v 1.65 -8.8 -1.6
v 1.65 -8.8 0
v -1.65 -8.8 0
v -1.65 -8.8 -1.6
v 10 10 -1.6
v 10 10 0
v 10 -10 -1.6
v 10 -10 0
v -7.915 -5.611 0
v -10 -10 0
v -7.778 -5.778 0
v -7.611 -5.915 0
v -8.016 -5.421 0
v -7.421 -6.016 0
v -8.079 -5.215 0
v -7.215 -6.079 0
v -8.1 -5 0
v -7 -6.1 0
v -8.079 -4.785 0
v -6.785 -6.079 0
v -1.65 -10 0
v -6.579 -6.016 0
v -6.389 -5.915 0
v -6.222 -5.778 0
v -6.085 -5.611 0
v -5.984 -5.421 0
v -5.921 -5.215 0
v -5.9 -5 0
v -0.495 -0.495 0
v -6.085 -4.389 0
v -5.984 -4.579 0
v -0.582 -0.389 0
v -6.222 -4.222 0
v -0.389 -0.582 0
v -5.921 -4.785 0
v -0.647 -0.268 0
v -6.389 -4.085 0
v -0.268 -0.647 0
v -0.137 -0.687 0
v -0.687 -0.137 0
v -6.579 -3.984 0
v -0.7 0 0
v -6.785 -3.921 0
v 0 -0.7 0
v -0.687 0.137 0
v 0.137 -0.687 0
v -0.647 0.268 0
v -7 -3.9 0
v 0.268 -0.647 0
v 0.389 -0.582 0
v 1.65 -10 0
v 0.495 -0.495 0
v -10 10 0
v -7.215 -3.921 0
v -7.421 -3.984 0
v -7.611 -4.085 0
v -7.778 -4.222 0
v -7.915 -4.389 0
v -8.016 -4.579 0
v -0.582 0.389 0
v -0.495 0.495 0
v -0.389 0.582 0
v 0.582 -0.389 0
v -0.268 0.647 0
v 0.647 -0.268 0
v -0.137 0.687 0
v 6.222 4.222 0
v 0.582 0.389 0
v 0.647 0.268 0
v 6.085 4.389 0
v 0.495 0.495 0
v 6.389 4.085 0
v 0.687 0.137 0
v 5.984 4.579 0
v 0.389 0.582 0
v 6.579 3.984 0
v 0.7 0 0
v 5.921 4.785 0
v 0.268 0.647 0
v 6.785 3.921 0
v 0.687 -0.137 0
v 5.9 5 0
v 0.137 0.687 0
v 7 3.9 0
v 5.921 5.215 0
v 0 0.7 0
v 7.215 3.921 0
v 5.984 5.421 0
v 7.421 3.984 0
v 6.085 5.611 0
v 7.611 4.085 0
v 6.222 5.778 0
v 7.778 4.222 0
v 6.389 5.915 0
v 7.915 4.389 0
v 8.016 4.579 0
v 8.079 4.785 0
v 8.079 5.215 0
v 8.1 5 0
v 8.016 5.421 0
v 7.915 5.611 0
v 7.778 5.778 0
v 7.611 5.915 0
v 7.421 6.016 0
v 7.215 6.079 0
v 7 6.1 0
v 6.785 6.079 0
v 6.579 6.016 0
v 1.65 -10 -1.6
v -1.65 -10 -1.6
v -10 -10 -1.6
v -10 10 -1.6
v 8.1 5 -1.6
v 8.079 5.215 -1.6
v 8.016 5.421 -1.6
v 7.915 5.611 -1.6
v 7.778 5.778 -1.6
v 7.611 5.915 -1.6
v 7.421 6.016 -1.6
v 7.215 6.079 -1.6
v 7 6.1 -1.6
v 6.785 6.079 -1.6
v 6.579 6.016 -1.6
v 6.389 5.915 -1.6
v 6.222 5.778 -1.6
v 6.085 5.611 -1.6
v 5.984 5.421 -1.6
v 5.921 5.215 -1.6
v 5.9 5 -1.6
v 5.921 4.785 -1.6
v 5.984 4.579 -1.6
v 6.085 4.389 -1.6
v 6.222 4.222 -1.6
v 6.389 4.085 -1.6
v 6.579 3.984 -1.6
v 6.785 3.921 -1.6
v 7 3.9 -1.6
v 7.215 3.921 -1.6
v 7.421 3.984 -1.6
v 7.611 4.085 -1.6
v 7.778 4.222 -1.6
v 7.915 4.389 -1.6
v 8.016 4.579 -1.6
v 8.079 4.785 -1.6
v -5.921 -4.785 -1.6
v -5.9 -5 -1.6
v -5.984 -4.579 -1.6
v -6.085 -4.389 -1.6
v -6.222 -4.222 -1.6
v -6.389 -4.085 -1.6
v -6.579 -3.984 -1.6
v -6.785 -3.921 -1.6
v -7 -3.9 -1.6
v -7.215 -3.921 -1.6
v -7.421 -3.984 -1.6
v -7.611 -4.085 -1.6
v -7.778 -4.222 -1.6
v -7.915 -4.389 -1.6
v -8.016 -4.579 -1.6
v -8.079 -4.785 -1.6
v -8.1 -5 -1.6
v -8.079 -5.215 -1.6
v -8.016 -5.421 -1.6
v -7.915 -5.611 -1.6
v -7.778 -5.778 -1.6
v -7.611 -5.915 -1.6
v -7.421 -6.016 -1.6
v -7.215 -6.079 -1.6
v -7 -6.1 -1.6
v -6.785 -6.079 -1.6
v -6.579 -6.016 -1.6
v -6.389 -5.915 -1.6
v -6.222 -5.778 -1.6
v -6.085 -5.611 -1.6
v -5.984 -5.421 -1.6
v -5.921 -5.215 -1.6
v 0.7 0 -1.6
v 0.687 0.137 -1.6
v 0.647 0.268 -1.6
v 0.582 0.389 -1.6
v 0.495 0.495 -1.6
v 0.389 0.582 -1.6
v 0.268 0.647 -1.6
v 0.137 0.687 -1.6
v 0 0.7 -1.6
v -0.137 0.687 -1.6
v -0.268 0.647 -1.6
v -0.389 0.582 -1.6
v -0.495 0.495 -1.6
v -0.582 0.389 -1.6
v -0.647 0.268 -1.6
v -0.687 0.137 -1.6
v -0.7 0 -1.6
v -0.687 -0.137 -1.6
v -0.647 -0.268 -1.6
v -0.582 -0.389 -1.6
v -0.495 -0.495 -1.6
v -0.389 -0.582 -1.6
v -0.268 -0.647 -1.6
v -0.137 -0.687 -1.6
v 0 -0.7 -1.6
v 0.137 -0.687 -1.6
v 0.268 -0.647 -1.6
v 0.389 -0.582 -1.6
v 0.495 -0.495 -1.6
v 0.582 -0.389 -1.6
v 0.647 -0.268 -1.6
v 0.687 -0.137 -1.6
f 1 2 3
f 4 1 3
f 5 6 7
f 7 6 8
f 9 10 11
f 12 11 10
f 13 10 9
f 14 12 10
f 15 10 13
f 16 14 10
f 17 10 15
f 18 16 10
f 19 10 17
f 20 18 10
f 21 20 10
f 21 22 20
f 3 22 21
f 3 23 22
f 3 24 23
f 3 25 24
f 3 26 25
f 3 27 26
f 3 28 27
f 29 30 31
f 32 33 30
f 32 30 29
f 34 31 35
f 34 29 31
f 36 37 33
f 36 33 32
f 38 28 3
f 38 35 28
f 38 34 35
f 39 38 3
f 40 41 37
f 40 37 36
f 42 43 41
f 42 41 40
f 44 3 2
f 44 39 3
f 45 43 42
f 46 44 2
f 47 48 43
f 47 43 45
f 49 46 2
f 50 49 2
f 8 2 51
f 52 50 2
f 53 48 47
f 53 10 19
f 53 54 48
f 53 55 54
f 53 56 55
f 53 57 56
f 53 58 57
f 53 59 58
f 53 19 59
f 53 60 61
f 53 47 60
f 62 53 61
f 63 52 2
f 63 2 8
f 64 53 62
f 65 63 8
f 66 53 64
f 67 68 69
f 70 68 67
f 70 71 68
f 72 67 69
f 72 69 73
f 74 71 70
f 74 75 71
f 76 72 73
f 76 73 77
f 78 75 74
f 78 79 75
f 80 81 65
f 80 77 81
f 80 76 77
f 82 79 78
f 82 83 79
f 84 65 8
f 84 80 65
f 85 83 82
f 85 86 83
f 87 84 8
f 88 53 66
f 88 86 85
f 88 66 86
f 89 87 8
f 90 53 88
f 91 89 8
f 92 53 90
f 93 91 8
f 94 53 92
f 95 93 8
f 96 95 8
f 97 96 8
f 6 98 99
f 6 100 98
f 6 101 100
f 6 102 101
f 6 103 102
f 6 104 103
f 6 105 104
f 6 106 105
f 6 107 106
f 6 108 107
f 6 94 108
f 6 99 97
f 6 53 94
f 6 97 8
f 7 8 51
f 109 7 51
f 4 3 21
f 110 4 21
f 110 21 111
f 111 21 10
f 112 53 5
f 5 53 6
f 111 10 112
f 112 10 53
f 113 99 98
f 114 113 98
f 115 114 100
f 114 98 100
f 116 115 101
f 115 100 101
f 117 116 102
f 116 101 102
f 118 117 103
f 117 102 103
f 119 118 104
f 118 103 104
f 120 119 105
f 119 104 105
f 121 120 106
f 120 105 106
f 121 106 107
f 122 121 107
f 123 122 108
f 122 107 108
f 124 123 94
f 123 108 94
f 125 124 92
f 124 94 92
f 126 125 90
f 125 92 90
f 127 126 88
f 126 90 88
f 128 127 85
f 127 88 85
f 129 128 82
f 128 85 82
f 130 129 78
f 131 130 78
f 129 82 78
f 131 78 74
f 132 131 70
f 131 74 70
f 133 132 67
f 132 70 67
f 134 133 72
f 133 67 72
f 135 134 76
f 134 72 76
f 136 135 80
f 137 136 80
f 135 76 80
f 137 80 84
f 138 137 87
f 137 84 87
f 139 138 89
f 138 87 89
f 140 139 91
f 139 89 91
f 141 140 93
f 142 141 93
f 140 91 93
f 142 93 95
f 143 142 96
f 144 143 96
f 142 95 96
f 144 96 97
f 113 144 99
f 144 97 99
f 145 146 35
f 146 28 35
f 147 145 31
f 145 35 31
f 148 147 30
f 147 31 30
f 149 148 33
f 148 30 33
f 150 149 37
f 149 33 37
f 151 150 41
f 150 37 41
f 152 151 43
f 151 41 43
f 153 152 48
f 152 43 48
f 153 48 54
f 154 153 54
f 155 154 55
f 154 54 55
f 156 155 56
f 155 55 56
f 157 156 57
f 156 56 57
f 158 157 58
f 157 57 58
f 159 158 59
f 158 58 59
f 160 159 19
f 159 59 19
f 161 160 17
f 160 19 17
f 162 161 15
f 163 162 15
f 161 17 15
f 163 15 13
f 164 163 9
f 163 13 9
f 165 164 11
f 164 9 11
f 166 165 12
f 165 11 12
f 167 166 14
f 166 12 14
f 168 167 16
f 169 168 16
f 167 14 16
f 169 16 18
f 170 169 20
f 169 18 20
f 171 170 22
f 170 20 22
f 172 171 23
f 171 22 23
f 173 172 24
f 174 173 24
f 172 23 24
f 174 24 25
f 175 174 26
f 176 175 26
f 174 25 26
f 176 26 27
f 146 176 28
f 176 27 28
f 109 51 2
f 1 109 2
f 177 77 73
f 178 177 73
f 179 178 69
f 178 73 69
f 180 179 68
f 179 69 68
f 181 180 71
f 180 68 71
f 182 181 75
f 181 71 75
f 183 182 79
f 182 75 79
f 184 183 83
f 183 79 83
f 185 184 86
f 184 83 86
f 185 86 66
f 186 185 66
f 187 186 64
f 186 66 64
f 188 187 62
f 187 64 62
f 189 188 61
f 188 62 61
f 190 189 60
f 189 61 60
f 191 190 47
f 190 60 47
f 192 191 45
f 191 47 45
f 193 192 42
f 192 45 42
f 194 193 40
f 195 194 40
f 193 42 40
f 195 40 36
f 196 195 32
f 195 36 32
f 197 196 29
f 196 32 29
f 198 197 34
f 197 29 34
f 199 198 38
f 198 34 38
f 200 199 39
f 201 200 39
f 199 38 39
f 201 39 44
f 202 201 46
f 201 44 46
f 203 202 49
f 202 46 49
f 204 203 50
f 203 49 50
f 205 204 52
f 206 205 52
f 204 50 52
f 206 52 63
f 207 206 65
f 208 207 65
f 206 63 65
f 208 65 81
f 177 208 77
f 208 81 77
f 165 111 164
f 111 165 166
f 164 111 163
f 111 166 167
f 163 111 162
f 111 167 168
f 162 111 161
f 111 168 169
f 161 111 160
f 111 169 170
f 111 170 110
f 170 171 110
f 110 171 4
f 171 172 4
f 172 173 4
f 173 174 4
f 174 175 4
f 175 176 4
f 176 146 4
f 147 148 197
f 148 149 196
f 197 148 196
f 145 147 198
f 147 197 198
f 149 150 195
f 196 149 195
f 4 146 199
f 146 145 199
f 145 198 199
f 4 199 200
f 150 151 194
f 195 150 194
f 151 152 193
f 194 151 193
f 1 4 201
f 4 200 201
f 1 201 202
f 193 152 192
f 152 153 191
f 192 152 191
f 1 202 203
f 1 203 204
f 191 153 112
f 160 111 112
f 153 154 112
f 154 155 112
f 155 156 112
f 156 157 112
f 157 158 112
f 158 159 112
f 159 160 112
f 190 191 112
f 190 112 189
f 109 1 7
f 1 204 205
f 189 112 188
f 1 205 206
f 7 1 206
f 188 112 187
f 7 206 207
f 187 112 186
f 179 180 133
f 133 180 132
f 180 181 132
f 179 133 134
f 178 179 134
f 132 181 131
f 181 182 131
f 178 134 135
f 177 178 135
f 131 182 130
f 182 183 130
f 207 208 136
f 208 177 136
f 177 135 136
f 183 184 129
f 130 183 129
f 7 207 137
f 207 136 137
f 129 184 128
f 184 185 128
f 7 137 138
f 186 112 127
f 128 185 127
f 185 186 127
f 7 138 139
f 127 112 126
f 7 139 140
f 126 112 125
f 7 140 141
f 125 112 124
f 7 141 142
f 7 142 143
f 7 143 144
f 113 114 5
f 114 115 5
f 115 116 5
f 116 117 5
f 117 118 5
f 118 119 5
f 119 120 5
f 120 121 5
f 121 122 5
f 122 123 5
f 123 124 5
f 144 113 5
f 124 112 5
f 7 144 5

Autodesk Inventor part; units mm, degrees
ref_plane "YZ Plane" through (0, 0, 0) normal (1, 0, 0) x (0, 1, 0)
ref_plane "XZ Plane" through (0, 0, 0) normal (0, 1, 0) x (-1, 0, 0)
ref_plane "XY Plane" through (0, 0, 0) normal (0, 0, 1) x (1, 0, 0)
ref_plane "作業平面1" through (0, 0, 0) normal (0, 0, 1) x (1, 0, 0)
sketch "スケッチ1" plane through (0, 0, 0) normal (0, 0, 1) x (1, 0, 0)
  line L0 (-12.7, 11.83) -> (-12.7, 13.57) projected
  line L1 (12.3, -13.97) -> (10.56, -13.97) projected
  line L2 (12.7, -11.83) -> (12.7, -13.57) projected
  line L3 (-10, 10) -> (10, 10)
  line L4 (10, 10) -> (10, -10)
  line L5 (10, -10) -> (-10, -10)
  line L6 (-10, -10) -> (-10, 10)
  point P0 (0, 0)
  dimension "d35" = 10
  dimension "d36" = 20
  dimension "d37" = 10
  dimension "d39" = 20
extrude "押し出し1" add sketch "スケッチ1" against normal blind 1.6
sketch "スケッチ2" plane through (0, 0, 0) normal (0, 0, 1) x (1, 0, 0)
  circle A0 centre (-7, -5) radius 1.1
  circle A1 centre (7, 5) radius 1.1
  point P0 (0, 0)
  dimension "d2" = 2.2
  dimension "d3" = 2.2
  dimension "d4" = 7
  dimension "d7" = 7
  dimension "d43" = 5
  dimension "d44" = 5
extrude "押し出し2" cut sketch "スケッチ2" along normal mid plane 20
sketch "スケッチ5" plane through (0, 0, 0) normal (0, 0, 1) x (1, 0, 0)
  circle A0 centre (0, 0) radius 0.7
  line L0 (1.65, -8.8) -> (-1.65, -8.8)
  line L1 (-1.65, -8.8) -> (-1.65, -14.7)
  line L2 (-1.65, -14.7) -> (1.65, -14.7)
  line L3 (1.65, -14.7) -> (1.65, -8.8)
  dimension "d16" = 1.4
  dimension "d40" = 1.65
  dimension "d41" = 3.3
  dimension "d42" = 8.8
extrude "押し出し5" cut sketch "スケッチ5" against normal blind 20
properties part number "HbSensorBoard02" material "CFRP"
